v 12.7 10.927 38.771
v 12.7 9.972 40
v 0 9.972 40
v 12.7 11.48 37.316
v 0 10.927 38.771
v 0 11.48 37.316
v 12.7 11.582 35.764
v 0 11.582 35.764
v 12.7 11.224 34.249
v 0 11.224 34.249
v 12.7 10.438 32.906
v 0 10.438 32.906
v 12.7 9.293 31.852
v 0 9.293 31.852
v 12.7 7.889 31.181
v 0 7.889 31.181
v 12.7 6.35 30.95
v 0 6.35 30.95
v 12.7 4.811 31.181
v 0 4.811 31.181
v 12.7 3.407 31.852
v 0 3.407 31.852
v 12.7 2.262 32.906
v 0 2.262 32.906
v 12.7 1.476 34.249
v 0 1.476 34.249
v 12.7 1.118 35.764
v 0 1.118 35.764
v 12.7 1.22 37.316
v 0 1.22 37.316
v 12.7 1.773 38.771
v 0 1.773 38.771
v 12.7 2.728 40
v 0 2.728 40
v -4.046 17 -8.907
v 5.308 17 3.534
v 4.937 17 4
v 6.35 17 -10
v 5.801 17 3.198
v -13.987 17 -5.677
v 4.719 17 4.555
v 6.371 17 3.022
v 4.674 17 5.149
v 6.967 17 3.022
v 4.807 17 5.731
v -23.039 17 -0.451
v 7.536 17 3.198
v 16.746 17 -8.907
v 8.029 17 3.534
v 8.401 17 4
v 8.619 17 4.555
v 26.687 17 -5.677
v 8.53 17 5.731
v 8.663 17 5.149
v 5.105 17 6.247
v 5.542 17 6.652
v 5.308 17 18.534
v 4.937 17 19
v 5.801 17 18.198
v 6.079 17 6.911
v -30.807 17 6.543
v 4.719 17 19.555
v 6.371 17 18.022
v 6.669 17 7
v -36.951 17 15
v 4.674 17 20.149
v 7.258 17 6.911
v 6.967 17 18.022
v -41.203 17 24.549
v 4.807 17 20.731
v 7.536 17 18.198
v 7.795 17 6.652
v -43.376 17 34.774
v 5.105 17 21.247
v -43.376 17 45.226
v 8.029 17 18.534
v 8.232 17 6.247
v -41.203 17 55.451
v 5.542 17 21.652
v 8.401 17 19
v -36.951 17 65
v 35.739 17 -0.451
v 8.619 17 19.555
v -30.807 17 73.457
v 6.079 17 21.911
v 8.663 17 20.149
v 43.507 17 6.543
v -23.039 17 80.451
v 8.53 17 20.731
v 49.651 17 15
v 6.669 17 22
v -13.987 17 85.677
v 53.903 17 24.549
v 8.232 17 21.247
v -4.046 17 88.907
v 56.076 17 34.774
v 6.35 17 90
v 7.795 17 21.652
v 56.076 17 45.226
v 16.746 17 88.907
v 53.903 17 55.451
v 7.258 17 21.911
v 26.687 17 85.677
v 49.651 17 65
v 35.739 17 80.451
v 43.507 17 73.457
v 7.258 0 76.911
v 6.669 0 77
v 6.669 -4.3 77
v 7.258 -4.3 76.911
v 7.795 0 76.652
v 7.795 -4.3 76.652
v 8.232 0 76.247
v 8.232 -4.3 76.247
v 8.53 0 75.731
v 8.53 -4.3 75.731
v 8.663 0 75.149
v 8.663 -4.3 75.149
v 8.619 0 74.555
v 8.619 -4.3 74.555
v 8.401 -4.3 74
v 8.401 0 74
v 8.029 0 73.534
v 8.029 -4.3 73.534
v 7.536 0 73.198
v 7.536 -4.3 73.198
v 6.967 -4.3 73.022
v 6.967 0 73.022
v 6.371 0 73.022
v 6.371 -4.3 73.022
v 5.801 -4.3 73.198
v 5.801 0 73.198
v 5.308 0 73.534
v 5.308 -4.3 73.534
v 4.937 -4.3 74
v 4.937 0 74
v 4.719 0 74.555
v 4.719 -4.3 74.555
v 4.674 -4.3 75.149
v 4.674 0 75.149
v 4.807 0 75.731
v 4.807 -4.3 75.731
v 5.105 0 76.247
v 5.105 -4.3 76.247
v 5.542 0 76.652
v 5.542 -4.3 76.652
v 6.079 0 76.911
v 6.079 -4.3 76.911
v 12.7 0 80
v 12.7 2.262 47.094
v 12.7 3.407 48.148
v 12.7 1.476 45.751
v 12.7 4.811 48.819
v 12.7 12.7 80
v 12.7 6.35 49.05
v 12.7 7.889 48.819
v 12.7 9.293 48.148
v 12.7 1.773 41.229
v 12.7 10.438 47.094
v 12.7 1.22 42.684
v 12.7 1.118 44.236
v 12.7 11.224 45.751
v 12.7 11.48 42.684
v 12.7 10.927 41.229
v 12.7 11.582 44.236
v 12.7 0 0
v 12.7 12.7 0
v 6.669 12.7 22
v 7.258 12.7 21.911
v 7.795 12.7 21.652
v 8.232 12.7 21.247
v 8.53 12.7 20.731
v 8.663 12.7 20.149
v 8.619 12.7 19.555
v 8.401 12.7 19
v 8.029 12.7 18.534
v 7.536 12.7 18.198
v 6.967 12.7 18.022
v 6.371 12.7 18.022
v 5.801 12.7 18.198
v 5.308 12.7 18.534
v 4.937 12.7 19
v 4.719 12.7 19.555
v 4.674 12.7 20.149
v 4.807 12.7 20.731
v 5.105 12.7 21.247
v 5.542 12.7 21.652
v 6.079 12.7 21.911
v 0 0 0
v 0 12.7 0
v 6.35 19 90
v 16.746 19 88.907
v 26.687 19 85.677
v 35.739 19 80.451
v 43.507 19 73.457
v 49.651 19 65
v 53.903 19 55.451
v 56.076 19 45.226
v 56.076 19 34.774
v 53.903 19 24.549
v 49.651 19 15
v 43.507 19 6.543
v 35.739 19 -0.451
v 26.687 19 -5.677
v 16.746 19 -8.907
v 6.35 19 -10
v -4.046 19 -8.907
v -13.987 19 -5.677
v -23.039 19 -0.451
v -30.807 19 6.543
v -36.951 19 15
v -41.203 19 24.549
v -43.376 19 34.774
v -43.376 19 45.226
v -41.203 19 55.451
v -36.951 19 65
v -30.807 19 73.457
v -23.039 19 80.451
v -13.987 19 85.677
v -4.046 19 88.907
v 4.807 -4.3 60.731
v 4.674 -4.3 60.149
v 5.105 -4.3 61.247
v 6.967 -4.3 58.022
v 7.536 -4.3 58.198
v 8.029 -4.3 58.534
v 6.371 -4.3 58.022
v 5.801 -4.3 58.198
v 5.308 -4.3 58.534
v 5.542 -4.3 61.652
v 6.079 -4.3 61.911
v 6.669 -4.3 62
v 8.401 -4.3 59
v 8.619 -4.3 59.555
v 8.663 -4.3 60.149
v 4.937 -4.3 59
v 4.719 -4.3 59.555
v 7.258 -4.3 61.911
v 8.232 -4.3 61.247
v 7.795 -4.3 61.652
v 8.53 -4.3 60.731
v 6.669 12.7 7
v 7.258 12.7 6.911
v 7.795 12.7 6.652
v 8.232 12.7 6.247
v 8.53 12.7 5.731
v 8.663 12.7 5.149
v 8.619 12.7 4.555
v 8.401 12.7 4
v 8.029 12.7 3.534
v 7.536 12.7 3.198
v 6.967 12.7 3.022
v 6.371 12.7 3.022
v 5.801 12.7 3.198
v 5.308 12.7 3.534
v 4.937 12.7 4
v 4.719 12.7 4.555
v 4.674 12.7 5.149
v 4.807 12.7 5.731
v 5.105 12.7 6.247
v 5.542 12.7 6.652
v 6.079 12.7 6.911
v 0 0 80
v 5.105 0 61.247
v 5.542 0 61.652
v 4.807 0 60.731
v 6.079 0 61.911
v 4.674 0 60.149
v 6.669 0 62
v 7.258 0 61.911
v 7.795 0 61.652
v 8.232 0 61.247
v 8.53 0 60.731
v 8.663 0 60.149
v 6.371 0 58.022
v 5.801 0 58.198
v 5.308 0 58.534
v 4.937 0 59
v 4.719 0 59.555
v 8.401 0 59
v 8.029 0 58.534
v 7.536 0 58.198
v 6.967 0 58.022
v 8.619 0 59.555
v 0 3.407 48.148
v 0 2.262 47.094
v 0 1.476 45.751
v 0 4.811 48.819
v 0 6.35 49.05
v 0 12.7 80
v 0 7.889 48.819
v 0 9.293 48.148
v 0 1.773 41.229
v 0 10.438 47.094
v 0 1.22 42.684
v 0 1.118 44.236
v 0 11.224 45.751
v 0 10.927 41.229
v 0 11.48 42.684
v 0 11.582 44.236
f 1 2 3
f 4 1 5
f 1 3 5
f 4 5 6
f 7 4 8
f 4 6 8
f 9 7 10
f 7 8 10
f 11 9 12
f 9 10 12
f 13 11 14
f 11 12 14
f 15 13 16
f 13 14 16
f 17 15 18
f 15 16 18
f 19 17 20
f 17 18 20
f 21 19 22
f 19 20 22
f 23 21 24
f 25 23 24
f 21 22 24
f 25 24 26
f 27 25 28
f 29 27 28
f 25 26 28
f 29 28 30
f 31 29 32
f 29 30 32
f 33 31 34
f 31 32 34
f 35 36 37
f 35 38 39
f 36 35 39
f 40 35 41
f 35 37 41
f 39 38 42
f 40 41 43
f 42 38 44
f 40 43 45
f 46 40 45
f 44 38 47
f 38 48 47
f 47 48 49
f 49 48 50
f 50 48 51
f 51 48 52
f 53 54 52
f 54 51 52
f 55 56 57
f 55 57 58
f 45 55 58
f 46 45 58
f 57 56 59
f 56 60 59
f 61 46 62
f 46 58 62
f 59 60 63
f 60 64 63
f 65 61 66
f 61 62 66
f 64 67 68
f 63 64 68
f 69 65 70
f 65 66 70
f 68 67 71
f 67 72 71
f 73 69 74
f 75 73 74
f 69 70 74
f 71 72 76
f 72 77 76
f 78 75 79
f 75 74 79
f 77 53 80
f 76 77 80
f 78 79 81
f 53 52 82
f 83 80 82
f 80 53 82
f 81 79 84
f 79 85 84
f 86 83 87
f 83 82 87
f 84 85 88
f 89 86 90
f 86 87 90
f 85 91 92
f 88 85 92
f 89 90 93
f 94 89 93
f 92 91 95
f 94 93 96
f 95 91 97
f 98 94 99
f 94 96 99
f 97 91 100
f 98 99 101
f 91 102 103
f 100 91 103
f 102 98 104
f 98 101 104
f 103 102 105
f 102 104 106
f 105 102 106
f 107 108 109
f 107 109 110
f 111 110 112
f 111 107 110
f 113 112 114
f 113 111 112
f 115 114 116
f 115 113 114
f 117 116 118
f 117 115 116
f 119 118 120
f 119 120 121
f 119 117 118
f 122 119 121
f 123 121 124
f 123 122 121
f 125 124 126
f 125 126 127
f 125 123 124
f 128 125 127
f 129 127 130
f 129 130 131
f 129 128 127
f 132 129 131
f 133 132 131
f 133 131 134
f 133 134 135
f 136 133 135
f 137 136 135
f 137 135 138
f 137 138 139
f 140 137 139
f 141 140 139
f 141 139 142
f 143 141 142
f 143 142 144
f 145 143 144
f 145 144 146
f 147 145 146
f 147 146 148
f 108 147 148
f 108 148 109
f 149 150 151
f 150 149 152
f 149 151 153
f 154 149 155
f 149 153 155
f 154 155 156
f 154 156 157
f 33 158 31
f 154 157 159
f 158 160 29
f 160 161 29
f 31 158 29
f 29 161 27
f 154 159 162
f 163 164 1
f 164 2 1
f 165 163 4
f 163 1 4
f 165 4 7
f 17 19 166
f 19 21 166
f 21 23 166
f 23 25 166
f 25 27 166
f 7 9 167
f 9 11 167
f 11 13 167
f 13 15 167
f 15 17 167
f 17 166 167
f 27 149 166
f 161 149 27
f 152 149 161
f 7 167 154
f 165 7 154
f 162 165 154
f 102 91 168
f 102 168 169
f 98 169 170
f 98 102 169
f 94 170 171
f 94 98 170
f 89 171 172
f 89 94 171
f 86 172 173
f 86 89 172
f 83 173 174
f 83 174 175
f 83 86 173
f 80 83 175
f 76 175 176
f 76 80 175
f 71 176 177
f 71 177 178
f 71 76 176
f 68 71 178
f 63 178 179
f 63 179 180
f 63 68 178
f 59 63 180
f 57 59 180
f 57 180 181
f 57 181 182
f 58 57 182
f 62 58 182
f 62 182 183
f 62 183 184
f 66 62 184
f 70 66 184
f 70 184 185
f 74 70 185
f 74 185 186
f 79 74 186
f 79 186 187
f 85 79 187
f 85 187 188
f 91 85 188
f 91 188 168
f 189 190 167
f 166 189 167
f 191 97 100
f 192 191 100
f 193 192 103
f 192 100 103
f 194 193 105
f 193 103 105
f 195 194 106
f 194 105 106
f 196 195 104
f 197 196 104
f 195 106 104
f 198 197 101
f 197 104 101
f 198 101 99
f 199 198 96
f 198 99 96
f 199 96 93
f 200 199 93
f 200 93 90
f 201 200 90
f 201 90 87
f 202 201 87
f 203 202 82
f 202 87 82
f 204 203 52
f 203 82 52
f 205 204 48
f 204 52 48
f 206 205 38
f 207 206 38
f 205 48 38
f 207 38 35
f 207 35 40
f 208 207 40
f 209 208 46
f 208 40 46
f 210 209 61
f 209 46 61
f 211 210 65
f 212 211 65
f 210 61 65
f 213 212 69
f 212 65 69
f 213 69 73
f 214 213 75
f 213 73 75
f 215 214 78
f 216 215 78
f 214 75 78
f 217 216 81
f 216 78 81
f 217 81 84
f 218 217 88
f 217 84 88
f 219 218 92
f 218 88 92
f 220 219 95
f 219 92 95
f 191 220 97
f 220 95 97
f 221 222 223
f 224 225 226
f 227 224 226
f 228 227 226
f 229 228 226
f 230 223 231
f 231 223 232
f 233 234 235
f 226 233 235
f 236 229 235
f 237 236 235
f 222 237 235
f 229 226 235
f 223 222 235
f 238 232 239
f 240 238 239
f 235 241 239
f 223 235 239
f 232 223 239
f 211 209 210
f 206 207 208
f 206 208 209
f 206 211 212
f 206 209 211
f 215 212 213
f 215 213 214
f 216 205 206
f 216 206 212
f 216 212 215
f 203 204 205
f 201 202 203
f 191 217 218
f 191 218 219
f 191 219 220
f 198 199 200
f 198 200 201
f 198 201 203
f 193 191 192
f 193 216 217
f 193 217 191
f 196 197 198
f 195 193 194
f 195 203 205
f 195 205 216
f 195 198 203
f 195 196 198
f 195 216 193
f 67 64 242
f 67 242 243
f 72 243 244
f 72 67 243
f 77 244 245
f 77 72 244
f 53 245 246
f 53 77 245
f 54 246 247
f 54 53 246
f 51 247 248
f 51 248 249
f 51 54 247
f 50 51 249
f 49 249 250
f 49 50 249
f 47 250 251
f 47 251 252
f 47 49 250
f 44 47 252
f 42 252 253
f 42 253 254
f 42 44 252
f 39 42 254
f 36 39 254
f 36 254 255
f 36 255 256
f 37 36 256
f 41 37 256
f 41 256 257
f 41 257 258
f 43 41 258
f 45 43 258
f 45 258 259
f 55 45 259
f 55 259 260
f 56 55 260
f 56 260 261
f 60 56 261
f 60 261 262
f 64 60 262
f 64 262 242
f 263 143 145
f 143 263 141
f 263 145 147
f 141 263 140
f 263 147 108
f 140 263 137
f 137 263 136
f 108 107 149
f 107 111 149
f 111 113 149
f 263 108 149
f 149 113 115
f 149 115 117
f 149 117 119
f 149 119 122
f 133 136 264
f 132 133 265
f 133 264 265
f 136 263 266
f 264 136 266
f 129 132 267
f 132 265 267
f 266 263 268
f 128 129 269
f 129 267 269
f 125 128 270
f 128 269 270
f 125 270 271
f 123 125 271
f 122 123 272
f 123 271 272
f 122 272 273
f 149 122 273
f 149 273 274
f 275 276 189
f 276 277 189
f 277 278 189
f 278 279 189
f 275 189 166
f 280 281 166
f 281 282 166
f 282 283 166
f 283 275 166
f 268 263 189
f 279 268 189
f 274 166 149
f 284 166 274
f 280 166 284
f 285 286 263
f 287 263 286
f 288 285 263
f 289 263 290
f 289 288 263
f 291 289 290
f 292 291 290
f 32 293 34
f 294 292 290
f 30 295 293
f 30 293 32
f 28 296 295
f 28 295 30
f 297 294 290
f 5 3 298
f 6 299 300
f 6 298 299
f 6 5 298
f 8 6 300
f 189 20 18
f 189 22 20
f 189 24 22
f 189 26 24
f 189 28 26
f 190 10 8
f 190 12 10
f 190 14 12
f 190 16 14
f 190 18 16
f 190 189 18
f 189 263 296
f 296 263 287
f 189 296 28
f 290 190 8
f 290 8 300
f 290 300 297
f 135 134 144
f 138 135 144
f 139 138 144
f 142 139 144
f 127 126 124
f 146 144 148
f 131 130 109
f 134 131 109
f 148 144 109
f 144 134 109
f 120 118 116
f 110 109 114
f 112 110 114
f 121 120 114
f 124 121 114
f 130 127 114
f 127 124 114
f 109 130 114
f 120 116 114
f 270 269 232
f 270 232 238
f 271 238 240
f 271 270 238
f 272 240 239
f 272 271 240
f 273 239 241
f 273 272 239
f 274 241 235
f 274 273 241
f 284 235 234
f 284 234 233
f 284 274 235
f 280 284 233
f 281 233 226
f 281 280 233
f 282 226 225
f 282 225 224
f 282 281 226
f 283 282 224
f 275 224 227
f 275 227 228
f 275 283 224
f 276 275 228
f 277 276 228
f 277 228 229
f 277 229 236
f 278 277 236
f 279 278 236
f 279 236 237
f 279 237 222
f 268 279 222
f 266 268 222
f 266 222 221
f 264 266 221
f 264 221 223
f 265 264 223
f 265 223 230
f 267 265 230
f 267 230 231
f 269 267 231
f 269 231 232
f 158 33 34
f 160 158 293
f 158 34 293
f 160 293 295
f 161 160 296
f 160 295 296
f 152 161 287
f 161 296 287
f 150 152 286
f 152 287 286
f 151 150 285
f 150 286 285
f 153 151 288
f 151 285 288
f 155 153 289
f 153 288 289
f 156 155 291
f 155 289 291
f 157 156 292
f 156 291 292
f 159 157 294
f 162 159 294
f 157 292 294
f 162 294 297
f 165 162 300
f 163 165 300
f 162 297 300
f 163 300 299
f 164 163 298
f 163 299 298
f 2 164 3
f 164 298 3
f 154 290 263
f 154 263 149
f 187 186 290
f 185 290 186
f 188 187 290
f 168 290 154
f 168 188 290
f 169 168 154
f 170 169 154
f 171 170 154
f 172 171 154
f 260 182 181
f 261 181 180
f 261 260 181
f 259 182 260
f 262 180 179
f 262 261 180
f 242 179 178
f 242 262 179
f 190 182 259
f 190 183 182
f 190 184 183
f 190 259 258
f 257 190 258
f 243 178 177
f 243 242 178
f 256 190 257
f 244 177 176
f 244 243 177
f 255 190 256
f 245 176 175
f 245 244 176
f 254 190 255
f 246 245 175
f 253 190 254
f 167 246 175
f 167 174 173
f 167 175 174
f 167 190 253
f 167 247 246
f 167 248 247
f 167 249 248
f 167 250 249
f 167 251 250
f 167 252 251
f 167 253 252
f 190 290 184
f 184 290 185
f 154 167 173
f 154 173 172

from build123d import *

# Parameters (mm, degrees)
SKETCH1_W           = 12.7
SKETCH1_H           = 12.7
BOSS_EXTRUDE1_DEPTH = 80
SKETCH2_R           = 2
CUT_EXTRUDE1_DEPTH  = 82.991341006
CUT_EXTRUDE2_DEPTH  = 82.991341006
BOSS_EXTRUDE2_START = 17
SKETCH5_R           = 2
BOSS_EXTRUDE2_DEPTH = 17
SKETCH6_R           = 2
BOSS_EXTRUDE3_DEPTH = 17
SKETCH7_R           = 50
BOSS_EXTRUDE4_DEPTH = 2


with BuildPart() as part:
    # Sketch1 → Boss-Extrude1 (new body)
    with BuildSketch(Plane.XY):
        with Locations((6.35, 6.35)):
            Rectangle(SKETCH1_W, SKETCH1_H)
    extrude(amount=BOSS_EXTRUDE1_DEPTH)

    # Sketch2 → Cut-Extrude1 (cut, through all)
    with BuildSketch(Plane(origin=(0, 12.7, 0), x_dir=(1, 0, 0), z_dir=(0, 1, 0))):
        with Locations(Location((6.668720536, -5, 0), (0, 0, 270))):
            Circle(SKETCH2_R)
        with Locations(Location((6.668720536, -20, 0), (0, 0, 270))):
            Circle(SKETCH2_R)
        with Locations(Location((6.668720536, -60, 0), (0, 0, 270))):
            Circle(SKETCH2_R)
        with Locations(Location((6.668720536, -75, 0), (0, 0, 270))):
            Circle(SKETCH2_R)
    extrude(amount=-CUT_EXTRUDE1_DEPTH, mode=Mode.SUBTRACT)

    # Sketch4 → Cut-Extrude2 (cut, through all)
    with BuildSketch(Plane.ZY):
        with BuildLine():
            ThreePointArc((40, 2.727500863), (49.05, 6.35), (40, 9.972499137))
            ThreePointArc((40, 9.972499137), (30.95, 6.35), (40, 2.727500863))
        make_face()
    extrude(amount=-CUT_EXTRUDE2_DEPTH, mode=Mode.SUBTRACT)

    # Sketch5 → Boss-Extrude2 (add)
    with BuildSketch(Plane(origin=(0, 0, 0), x_dir=(1, 0, 0), z_dir=(0, 1, 0)).offset(BOSS_EXTRUDE2_START)):
        with Locations(Location((6.668720536, -20, 0), (0, 0, 270))):
            Circle(SKETCH5_R)
        with Locations(Location((6.668720536, -5, 0), (0, 0, 270))):
            Circle(SKETCH5_R)
    extrude(amount=-BOSS_EXTRUDE2_DEPTH)

    # Sketch6 → Boss-Extrude3 (add)
    with BuildSketch(Plane(origin=(0, 12.7, 0), x_dir=(1, 0, 0), z_dir=(0, 1, 0))):
        with Locations(Location((6.668720536, -75, 0), (0, 0, 270))):
            Circle(SKETCH6_R)
        with Locations(Location((6.668720536, -60, 0), (0, 0, 270))):
            Circle(SKETCH6_R)
    extrude(amount=-BOSS_EXTRUDE3_DEPTH)

    # Sketch7 → Boss-Extrude4 (add)
    with BuildSketch(Plane(origin=(0, 17, 0), x_dir=(1, 0, 0), z_dir=(0, 1, 0))):
        with Locations(Location((6.35, -40, 0), (0, 0, 270))):
            Circle(SKETCH7_R)
    extrude(amount=BOSS_EXTRUDE4_DEPTH)


solid = part.part
